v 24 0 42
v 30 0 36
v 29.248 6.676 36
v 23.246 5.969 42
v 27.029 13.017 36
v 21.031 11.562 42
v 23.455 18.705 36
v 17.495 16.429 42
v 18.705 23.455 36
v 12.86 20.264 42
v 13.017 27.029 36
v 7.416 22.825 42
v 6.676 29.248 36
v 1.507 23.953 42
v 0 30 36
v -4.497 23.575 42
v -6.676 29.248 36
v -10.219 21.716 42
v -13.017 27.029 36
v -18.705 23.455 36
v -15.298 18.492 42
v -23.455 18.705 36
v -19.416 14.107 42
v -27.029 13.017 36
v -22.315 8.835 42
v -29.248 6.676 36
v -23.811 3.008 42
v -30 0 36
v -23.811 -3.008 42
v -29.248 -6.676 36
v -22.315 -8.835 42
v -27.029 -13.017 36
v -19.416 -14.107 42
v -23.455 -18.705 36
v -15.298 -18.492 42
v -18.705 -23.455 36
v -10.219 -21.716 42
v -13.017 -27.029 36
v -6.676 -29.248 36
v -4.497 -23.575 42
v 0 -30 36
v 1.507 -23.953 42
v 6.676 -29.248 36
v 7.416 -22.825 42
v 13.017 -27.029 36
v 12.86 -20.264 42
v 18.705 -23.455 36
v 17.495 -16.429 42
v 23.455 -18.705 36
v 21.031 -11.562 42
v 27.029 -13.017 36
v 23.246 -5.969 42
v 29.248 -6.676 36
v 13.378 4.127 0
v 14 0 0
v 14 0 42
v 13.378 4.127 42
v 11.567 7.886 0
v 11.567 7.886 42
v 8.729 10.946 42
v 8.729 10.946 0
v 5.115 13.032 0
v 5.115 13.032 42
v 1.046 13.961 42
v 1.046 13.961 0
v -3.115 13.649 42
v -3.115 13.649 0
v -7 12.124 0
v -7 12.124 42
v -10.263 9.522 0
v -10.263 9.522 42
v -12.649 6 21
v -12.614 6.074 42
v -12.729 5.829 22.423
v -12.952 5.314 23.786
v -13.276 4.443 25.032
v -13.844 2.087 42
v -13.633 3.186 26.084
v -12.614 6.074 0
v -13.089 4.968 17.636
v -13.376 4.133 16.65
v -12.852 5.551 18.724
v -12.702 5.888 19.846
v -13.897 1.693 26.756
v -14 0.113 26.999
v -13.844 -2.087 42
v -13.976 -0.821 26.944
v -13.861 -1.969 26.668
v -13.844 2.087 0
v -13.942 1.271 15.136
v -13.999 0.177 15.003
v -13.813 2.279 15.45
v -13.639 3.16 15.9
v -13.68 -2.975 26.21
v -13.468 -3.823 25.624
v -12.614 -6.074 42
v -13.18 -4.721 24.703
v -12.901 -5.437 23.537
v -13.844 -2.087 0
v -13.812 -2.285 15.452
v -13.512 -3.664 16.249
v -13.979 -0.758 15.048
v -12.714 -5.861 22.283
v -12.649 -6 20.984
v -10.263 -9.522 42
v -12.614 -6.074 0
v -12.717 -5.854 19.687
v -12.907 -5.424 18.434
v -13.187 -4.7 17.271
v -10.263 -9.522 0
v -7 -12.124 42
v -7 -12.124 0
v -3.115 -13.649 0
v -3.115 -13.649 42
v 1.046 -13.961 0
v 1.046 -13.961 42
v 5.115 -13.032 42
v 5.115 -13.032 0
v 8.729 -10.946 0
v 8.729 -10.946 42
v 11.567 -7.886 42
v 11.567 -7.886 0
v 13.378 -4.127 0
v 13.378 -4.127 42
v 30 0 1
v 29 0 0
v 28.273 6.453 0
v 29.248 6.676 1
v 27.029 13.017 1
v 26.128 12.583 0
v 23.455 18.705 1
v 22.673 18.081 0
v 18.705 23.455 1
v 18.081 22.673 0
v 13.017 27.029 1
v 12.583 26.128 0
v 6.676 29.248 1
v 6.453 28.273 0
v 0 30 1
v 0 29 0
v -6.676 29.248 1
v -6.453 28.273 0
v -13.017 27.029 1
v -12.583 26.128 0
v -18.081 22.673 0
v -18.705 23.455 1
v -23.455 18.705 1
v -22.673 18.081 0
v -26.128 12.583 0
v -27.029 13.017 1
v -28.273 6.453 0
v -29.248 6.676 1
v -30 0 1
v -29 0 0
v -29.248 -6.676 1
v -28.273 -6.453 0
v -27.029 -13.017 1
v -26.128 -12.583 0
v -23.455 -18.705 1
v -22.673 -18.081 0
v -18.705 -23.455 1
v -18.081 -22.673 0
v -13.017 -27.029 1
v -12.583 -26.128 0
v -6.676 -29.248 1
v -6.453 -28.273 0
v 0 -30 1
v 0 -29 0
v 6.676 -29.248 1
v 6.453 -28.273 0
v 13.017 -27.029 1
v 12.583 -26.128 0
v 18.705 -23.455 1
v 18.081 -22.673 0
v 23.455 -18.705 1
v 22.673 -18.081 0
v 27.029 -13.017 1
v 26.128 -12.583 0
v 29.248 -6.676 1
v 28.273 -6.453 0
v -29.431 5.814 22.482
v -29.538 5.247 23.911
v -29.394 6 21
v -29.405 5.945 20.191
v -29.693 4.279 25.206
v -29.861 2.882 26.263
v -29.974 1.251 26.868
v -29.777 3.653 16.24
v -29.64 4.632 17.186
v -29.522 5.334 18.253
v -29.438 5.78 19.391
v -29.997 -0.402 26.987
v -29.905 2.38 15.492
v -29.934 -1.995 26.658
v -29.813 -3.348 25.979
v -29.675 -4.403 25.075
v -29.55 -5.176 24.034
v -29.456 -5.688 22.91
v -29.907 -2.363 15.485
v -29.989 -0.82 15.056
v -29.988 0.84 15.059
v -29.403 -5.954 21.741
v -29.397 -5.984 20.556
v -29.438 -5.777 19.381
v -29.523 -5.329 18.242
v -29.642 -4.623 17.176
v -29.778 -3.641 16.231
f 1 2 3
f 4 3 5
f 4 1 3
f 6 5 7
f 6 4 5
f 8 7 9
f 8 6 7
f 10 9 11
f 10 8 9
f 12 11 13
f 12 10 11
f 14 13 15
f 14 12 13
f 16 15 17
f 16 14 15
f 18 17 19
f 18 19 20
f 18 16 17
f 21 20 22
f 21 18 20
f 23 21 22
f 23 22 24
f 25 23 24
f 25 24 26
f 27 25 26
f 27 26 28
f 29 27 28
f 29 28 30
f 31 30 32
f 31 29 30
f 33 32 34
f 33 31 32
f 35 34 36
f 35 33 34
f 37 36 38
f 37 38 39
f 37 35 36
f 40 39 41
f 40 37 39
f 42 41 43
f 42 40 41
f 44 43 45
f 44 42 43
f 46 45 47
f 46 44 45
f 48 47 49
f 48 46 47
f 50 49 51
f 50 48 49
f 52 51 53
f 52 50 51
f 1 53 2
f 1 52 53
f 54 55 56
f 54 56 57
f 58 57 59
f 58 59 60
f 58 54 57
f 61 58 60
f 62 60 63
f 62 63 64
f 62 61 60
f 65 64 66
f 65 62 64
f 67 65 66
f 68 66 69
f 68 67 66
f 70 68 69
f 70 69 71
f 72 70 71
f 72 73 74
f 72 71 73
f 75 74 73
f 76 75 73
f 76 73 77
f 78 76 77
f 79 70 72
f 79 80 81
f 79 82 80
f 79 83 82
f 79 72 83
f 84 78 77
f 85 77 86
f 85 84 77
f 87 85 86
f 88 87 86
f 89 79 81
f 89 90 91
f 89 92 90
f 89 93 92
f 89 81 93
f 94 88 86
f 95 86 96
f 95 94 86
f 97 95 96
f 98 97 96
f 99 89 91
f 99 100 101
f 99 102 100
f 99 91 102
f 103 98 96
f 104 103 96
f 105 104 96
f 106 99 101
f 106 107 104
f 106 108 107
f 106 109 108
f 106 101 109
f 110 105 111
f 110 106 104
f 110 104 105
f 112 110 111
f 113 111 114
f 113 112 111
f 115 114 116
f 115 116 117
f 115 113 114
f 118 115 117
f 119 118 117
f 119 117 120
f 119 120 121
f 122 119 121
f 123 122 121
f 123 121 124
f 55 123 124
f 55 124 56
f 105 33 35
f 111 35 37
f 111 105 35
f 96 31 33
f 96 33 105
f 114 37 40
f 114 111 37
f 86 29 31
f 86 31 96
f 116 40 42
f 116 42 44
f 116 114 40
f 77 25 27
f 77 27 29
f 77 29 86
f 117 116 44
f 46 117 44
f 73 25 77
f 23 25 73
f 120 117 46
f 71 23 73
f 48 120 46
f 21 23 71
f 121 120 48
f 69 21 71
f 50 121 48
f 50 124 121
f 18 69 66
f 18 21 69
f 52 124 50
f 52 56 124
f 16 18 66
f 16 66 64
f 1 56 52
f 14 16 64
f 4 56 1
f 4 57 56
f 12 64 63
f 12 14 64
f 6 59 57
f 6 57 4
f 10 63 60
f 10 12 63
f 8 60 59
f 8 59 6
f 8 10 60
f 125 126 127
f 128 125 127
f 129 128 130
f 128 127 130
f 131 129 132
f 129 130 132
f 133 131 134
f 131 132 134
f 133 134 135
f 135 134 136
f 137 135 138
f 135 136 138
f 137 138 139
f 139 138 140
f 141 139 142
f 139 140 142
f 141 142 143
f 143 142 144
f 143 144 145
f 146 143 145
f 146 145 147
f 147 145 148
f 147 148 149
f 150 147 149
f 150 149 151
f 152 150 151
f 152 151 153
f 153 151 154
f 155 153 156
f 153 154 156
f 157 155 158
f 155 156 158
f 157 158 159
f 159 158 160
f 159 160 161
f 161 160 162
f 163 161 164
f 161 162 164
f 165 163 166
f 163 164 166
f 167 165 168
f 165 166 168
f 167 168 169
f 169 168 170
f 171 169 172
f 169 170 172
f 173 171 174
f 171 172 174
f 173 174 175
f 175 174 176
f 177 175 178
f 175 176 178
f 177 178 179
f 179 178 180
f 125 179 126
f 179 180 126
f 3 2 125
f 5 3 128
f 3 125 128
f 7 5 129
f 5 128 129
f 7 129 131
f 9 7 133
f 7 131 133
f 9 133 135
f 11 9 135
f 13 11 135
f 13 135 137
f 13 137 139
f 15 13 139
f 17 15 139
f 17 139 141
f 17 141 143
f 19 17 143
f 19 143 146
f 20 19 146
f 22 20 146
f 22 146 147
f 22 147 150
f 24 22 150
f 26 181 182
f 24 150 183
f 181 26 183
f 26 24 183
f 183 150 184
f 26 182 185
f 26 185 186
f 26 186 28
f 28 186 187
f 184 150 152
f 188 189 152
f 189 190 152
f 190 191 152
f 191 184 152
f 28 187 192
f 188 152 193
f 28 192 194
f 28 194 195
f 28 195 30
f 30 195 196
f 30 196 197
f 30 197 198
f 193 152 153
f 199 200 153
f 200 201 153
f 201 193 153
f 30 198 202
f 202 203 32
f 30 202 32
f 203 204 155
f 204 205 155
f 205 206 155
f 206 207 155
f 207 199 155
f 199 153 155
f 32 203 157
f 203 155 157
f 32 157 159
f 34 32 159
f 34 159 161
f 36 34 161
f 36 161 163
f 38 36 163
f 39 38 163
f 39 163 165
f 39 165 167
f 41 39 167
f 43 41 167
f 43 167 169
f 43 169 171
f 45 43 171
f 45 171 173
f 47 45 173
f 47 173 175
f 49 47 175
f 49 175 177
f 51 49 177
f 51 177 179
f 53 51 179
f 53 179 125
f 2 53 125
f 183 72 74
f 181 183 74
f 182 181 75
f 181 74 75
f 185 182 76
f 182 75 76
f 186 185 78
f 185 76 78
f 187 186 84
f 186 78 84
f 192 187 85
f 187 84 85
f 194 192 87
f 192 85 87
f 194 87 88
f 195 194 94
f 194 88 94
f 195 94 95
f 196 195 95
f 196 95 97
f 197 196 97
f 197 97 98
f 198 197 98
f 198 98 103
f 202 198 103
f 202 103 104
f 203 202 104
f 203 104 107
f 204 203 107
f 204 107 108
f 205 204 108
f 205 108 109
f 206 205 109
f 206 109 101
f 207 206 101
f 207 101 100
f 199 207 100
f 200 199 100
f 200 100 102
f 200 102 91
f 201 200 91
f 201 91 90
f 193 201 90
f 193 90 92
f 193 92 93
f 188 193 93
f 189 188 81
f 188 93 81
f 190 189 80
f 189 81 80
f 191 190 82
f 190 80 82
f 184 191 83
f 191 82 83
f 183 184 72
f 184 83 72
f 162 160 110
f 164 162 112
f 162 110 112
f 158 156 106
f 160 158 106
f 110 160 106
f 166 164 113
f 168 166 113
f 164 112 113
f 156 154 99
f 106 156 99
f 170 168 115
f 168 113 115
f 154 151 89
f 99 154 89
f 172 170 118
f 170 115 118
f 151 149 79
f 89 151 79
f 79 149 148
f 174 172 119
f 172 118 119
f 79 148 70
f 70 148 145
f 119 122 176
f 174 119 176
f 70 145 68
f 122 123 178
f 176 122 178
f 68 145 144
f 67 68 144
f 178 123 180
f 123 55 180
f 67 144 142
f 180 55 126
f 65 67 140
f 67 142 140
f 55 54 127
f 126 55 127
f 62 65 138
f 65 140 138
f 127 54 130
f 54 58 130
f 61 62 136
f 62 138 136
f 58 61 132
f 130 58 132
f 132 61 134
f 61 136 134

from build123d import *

# Parameters (mm, degrees)
F0_R     = 30
F0_R_2   = 14
F1_DEPTH = 42
F3_D     = 12
F3_DEPTH = 30
F3_TIP   = 3.6051637142
F4_SIZE  = 6
F5_SIZE  = 1


with BuildPart() as f1:
    # F0 (on Top) → F1 (new body)
    with BuildSketch(Plane.XY):
        Circle(F0_R)
        Circle(F0_R_2, mode=Mode.SUBTRACT)
    extrude(amount=F1_DEPTH)

    # F3 (one way)
    with BuildSketch(Plane.YZ):
        with Locations((0, 21)):
            Circle(F3_D / 2)
    extrude(amount=-F3_DEPTH, mode=Mode.SUBTRACT)
    with Locations(Plane.YZ):
        with Locations((0, 21)):
            with Locations((0, 0, -(F3_DEPTH + F3_TIP / 2))):  # 118° drill point
                Cone(0, F3_D / 2, F3_TIP, mode=Mode.SUBTRACT)

    # F4
    f4_edges = [f1.edges().sort_by_distance(p)[0] for p in [
        (-30, 0, 42),
    ]]
    chamfer(f4_edges, length=F4_SIZE)

    # F5
    f5_edges = [f1.edges().sort_by_distance(p)[0] for p in [
        (-30, 0, 0),
    ]]
    chamfer(f5_edges, length=F5_SIZE)


solid = f1.part
